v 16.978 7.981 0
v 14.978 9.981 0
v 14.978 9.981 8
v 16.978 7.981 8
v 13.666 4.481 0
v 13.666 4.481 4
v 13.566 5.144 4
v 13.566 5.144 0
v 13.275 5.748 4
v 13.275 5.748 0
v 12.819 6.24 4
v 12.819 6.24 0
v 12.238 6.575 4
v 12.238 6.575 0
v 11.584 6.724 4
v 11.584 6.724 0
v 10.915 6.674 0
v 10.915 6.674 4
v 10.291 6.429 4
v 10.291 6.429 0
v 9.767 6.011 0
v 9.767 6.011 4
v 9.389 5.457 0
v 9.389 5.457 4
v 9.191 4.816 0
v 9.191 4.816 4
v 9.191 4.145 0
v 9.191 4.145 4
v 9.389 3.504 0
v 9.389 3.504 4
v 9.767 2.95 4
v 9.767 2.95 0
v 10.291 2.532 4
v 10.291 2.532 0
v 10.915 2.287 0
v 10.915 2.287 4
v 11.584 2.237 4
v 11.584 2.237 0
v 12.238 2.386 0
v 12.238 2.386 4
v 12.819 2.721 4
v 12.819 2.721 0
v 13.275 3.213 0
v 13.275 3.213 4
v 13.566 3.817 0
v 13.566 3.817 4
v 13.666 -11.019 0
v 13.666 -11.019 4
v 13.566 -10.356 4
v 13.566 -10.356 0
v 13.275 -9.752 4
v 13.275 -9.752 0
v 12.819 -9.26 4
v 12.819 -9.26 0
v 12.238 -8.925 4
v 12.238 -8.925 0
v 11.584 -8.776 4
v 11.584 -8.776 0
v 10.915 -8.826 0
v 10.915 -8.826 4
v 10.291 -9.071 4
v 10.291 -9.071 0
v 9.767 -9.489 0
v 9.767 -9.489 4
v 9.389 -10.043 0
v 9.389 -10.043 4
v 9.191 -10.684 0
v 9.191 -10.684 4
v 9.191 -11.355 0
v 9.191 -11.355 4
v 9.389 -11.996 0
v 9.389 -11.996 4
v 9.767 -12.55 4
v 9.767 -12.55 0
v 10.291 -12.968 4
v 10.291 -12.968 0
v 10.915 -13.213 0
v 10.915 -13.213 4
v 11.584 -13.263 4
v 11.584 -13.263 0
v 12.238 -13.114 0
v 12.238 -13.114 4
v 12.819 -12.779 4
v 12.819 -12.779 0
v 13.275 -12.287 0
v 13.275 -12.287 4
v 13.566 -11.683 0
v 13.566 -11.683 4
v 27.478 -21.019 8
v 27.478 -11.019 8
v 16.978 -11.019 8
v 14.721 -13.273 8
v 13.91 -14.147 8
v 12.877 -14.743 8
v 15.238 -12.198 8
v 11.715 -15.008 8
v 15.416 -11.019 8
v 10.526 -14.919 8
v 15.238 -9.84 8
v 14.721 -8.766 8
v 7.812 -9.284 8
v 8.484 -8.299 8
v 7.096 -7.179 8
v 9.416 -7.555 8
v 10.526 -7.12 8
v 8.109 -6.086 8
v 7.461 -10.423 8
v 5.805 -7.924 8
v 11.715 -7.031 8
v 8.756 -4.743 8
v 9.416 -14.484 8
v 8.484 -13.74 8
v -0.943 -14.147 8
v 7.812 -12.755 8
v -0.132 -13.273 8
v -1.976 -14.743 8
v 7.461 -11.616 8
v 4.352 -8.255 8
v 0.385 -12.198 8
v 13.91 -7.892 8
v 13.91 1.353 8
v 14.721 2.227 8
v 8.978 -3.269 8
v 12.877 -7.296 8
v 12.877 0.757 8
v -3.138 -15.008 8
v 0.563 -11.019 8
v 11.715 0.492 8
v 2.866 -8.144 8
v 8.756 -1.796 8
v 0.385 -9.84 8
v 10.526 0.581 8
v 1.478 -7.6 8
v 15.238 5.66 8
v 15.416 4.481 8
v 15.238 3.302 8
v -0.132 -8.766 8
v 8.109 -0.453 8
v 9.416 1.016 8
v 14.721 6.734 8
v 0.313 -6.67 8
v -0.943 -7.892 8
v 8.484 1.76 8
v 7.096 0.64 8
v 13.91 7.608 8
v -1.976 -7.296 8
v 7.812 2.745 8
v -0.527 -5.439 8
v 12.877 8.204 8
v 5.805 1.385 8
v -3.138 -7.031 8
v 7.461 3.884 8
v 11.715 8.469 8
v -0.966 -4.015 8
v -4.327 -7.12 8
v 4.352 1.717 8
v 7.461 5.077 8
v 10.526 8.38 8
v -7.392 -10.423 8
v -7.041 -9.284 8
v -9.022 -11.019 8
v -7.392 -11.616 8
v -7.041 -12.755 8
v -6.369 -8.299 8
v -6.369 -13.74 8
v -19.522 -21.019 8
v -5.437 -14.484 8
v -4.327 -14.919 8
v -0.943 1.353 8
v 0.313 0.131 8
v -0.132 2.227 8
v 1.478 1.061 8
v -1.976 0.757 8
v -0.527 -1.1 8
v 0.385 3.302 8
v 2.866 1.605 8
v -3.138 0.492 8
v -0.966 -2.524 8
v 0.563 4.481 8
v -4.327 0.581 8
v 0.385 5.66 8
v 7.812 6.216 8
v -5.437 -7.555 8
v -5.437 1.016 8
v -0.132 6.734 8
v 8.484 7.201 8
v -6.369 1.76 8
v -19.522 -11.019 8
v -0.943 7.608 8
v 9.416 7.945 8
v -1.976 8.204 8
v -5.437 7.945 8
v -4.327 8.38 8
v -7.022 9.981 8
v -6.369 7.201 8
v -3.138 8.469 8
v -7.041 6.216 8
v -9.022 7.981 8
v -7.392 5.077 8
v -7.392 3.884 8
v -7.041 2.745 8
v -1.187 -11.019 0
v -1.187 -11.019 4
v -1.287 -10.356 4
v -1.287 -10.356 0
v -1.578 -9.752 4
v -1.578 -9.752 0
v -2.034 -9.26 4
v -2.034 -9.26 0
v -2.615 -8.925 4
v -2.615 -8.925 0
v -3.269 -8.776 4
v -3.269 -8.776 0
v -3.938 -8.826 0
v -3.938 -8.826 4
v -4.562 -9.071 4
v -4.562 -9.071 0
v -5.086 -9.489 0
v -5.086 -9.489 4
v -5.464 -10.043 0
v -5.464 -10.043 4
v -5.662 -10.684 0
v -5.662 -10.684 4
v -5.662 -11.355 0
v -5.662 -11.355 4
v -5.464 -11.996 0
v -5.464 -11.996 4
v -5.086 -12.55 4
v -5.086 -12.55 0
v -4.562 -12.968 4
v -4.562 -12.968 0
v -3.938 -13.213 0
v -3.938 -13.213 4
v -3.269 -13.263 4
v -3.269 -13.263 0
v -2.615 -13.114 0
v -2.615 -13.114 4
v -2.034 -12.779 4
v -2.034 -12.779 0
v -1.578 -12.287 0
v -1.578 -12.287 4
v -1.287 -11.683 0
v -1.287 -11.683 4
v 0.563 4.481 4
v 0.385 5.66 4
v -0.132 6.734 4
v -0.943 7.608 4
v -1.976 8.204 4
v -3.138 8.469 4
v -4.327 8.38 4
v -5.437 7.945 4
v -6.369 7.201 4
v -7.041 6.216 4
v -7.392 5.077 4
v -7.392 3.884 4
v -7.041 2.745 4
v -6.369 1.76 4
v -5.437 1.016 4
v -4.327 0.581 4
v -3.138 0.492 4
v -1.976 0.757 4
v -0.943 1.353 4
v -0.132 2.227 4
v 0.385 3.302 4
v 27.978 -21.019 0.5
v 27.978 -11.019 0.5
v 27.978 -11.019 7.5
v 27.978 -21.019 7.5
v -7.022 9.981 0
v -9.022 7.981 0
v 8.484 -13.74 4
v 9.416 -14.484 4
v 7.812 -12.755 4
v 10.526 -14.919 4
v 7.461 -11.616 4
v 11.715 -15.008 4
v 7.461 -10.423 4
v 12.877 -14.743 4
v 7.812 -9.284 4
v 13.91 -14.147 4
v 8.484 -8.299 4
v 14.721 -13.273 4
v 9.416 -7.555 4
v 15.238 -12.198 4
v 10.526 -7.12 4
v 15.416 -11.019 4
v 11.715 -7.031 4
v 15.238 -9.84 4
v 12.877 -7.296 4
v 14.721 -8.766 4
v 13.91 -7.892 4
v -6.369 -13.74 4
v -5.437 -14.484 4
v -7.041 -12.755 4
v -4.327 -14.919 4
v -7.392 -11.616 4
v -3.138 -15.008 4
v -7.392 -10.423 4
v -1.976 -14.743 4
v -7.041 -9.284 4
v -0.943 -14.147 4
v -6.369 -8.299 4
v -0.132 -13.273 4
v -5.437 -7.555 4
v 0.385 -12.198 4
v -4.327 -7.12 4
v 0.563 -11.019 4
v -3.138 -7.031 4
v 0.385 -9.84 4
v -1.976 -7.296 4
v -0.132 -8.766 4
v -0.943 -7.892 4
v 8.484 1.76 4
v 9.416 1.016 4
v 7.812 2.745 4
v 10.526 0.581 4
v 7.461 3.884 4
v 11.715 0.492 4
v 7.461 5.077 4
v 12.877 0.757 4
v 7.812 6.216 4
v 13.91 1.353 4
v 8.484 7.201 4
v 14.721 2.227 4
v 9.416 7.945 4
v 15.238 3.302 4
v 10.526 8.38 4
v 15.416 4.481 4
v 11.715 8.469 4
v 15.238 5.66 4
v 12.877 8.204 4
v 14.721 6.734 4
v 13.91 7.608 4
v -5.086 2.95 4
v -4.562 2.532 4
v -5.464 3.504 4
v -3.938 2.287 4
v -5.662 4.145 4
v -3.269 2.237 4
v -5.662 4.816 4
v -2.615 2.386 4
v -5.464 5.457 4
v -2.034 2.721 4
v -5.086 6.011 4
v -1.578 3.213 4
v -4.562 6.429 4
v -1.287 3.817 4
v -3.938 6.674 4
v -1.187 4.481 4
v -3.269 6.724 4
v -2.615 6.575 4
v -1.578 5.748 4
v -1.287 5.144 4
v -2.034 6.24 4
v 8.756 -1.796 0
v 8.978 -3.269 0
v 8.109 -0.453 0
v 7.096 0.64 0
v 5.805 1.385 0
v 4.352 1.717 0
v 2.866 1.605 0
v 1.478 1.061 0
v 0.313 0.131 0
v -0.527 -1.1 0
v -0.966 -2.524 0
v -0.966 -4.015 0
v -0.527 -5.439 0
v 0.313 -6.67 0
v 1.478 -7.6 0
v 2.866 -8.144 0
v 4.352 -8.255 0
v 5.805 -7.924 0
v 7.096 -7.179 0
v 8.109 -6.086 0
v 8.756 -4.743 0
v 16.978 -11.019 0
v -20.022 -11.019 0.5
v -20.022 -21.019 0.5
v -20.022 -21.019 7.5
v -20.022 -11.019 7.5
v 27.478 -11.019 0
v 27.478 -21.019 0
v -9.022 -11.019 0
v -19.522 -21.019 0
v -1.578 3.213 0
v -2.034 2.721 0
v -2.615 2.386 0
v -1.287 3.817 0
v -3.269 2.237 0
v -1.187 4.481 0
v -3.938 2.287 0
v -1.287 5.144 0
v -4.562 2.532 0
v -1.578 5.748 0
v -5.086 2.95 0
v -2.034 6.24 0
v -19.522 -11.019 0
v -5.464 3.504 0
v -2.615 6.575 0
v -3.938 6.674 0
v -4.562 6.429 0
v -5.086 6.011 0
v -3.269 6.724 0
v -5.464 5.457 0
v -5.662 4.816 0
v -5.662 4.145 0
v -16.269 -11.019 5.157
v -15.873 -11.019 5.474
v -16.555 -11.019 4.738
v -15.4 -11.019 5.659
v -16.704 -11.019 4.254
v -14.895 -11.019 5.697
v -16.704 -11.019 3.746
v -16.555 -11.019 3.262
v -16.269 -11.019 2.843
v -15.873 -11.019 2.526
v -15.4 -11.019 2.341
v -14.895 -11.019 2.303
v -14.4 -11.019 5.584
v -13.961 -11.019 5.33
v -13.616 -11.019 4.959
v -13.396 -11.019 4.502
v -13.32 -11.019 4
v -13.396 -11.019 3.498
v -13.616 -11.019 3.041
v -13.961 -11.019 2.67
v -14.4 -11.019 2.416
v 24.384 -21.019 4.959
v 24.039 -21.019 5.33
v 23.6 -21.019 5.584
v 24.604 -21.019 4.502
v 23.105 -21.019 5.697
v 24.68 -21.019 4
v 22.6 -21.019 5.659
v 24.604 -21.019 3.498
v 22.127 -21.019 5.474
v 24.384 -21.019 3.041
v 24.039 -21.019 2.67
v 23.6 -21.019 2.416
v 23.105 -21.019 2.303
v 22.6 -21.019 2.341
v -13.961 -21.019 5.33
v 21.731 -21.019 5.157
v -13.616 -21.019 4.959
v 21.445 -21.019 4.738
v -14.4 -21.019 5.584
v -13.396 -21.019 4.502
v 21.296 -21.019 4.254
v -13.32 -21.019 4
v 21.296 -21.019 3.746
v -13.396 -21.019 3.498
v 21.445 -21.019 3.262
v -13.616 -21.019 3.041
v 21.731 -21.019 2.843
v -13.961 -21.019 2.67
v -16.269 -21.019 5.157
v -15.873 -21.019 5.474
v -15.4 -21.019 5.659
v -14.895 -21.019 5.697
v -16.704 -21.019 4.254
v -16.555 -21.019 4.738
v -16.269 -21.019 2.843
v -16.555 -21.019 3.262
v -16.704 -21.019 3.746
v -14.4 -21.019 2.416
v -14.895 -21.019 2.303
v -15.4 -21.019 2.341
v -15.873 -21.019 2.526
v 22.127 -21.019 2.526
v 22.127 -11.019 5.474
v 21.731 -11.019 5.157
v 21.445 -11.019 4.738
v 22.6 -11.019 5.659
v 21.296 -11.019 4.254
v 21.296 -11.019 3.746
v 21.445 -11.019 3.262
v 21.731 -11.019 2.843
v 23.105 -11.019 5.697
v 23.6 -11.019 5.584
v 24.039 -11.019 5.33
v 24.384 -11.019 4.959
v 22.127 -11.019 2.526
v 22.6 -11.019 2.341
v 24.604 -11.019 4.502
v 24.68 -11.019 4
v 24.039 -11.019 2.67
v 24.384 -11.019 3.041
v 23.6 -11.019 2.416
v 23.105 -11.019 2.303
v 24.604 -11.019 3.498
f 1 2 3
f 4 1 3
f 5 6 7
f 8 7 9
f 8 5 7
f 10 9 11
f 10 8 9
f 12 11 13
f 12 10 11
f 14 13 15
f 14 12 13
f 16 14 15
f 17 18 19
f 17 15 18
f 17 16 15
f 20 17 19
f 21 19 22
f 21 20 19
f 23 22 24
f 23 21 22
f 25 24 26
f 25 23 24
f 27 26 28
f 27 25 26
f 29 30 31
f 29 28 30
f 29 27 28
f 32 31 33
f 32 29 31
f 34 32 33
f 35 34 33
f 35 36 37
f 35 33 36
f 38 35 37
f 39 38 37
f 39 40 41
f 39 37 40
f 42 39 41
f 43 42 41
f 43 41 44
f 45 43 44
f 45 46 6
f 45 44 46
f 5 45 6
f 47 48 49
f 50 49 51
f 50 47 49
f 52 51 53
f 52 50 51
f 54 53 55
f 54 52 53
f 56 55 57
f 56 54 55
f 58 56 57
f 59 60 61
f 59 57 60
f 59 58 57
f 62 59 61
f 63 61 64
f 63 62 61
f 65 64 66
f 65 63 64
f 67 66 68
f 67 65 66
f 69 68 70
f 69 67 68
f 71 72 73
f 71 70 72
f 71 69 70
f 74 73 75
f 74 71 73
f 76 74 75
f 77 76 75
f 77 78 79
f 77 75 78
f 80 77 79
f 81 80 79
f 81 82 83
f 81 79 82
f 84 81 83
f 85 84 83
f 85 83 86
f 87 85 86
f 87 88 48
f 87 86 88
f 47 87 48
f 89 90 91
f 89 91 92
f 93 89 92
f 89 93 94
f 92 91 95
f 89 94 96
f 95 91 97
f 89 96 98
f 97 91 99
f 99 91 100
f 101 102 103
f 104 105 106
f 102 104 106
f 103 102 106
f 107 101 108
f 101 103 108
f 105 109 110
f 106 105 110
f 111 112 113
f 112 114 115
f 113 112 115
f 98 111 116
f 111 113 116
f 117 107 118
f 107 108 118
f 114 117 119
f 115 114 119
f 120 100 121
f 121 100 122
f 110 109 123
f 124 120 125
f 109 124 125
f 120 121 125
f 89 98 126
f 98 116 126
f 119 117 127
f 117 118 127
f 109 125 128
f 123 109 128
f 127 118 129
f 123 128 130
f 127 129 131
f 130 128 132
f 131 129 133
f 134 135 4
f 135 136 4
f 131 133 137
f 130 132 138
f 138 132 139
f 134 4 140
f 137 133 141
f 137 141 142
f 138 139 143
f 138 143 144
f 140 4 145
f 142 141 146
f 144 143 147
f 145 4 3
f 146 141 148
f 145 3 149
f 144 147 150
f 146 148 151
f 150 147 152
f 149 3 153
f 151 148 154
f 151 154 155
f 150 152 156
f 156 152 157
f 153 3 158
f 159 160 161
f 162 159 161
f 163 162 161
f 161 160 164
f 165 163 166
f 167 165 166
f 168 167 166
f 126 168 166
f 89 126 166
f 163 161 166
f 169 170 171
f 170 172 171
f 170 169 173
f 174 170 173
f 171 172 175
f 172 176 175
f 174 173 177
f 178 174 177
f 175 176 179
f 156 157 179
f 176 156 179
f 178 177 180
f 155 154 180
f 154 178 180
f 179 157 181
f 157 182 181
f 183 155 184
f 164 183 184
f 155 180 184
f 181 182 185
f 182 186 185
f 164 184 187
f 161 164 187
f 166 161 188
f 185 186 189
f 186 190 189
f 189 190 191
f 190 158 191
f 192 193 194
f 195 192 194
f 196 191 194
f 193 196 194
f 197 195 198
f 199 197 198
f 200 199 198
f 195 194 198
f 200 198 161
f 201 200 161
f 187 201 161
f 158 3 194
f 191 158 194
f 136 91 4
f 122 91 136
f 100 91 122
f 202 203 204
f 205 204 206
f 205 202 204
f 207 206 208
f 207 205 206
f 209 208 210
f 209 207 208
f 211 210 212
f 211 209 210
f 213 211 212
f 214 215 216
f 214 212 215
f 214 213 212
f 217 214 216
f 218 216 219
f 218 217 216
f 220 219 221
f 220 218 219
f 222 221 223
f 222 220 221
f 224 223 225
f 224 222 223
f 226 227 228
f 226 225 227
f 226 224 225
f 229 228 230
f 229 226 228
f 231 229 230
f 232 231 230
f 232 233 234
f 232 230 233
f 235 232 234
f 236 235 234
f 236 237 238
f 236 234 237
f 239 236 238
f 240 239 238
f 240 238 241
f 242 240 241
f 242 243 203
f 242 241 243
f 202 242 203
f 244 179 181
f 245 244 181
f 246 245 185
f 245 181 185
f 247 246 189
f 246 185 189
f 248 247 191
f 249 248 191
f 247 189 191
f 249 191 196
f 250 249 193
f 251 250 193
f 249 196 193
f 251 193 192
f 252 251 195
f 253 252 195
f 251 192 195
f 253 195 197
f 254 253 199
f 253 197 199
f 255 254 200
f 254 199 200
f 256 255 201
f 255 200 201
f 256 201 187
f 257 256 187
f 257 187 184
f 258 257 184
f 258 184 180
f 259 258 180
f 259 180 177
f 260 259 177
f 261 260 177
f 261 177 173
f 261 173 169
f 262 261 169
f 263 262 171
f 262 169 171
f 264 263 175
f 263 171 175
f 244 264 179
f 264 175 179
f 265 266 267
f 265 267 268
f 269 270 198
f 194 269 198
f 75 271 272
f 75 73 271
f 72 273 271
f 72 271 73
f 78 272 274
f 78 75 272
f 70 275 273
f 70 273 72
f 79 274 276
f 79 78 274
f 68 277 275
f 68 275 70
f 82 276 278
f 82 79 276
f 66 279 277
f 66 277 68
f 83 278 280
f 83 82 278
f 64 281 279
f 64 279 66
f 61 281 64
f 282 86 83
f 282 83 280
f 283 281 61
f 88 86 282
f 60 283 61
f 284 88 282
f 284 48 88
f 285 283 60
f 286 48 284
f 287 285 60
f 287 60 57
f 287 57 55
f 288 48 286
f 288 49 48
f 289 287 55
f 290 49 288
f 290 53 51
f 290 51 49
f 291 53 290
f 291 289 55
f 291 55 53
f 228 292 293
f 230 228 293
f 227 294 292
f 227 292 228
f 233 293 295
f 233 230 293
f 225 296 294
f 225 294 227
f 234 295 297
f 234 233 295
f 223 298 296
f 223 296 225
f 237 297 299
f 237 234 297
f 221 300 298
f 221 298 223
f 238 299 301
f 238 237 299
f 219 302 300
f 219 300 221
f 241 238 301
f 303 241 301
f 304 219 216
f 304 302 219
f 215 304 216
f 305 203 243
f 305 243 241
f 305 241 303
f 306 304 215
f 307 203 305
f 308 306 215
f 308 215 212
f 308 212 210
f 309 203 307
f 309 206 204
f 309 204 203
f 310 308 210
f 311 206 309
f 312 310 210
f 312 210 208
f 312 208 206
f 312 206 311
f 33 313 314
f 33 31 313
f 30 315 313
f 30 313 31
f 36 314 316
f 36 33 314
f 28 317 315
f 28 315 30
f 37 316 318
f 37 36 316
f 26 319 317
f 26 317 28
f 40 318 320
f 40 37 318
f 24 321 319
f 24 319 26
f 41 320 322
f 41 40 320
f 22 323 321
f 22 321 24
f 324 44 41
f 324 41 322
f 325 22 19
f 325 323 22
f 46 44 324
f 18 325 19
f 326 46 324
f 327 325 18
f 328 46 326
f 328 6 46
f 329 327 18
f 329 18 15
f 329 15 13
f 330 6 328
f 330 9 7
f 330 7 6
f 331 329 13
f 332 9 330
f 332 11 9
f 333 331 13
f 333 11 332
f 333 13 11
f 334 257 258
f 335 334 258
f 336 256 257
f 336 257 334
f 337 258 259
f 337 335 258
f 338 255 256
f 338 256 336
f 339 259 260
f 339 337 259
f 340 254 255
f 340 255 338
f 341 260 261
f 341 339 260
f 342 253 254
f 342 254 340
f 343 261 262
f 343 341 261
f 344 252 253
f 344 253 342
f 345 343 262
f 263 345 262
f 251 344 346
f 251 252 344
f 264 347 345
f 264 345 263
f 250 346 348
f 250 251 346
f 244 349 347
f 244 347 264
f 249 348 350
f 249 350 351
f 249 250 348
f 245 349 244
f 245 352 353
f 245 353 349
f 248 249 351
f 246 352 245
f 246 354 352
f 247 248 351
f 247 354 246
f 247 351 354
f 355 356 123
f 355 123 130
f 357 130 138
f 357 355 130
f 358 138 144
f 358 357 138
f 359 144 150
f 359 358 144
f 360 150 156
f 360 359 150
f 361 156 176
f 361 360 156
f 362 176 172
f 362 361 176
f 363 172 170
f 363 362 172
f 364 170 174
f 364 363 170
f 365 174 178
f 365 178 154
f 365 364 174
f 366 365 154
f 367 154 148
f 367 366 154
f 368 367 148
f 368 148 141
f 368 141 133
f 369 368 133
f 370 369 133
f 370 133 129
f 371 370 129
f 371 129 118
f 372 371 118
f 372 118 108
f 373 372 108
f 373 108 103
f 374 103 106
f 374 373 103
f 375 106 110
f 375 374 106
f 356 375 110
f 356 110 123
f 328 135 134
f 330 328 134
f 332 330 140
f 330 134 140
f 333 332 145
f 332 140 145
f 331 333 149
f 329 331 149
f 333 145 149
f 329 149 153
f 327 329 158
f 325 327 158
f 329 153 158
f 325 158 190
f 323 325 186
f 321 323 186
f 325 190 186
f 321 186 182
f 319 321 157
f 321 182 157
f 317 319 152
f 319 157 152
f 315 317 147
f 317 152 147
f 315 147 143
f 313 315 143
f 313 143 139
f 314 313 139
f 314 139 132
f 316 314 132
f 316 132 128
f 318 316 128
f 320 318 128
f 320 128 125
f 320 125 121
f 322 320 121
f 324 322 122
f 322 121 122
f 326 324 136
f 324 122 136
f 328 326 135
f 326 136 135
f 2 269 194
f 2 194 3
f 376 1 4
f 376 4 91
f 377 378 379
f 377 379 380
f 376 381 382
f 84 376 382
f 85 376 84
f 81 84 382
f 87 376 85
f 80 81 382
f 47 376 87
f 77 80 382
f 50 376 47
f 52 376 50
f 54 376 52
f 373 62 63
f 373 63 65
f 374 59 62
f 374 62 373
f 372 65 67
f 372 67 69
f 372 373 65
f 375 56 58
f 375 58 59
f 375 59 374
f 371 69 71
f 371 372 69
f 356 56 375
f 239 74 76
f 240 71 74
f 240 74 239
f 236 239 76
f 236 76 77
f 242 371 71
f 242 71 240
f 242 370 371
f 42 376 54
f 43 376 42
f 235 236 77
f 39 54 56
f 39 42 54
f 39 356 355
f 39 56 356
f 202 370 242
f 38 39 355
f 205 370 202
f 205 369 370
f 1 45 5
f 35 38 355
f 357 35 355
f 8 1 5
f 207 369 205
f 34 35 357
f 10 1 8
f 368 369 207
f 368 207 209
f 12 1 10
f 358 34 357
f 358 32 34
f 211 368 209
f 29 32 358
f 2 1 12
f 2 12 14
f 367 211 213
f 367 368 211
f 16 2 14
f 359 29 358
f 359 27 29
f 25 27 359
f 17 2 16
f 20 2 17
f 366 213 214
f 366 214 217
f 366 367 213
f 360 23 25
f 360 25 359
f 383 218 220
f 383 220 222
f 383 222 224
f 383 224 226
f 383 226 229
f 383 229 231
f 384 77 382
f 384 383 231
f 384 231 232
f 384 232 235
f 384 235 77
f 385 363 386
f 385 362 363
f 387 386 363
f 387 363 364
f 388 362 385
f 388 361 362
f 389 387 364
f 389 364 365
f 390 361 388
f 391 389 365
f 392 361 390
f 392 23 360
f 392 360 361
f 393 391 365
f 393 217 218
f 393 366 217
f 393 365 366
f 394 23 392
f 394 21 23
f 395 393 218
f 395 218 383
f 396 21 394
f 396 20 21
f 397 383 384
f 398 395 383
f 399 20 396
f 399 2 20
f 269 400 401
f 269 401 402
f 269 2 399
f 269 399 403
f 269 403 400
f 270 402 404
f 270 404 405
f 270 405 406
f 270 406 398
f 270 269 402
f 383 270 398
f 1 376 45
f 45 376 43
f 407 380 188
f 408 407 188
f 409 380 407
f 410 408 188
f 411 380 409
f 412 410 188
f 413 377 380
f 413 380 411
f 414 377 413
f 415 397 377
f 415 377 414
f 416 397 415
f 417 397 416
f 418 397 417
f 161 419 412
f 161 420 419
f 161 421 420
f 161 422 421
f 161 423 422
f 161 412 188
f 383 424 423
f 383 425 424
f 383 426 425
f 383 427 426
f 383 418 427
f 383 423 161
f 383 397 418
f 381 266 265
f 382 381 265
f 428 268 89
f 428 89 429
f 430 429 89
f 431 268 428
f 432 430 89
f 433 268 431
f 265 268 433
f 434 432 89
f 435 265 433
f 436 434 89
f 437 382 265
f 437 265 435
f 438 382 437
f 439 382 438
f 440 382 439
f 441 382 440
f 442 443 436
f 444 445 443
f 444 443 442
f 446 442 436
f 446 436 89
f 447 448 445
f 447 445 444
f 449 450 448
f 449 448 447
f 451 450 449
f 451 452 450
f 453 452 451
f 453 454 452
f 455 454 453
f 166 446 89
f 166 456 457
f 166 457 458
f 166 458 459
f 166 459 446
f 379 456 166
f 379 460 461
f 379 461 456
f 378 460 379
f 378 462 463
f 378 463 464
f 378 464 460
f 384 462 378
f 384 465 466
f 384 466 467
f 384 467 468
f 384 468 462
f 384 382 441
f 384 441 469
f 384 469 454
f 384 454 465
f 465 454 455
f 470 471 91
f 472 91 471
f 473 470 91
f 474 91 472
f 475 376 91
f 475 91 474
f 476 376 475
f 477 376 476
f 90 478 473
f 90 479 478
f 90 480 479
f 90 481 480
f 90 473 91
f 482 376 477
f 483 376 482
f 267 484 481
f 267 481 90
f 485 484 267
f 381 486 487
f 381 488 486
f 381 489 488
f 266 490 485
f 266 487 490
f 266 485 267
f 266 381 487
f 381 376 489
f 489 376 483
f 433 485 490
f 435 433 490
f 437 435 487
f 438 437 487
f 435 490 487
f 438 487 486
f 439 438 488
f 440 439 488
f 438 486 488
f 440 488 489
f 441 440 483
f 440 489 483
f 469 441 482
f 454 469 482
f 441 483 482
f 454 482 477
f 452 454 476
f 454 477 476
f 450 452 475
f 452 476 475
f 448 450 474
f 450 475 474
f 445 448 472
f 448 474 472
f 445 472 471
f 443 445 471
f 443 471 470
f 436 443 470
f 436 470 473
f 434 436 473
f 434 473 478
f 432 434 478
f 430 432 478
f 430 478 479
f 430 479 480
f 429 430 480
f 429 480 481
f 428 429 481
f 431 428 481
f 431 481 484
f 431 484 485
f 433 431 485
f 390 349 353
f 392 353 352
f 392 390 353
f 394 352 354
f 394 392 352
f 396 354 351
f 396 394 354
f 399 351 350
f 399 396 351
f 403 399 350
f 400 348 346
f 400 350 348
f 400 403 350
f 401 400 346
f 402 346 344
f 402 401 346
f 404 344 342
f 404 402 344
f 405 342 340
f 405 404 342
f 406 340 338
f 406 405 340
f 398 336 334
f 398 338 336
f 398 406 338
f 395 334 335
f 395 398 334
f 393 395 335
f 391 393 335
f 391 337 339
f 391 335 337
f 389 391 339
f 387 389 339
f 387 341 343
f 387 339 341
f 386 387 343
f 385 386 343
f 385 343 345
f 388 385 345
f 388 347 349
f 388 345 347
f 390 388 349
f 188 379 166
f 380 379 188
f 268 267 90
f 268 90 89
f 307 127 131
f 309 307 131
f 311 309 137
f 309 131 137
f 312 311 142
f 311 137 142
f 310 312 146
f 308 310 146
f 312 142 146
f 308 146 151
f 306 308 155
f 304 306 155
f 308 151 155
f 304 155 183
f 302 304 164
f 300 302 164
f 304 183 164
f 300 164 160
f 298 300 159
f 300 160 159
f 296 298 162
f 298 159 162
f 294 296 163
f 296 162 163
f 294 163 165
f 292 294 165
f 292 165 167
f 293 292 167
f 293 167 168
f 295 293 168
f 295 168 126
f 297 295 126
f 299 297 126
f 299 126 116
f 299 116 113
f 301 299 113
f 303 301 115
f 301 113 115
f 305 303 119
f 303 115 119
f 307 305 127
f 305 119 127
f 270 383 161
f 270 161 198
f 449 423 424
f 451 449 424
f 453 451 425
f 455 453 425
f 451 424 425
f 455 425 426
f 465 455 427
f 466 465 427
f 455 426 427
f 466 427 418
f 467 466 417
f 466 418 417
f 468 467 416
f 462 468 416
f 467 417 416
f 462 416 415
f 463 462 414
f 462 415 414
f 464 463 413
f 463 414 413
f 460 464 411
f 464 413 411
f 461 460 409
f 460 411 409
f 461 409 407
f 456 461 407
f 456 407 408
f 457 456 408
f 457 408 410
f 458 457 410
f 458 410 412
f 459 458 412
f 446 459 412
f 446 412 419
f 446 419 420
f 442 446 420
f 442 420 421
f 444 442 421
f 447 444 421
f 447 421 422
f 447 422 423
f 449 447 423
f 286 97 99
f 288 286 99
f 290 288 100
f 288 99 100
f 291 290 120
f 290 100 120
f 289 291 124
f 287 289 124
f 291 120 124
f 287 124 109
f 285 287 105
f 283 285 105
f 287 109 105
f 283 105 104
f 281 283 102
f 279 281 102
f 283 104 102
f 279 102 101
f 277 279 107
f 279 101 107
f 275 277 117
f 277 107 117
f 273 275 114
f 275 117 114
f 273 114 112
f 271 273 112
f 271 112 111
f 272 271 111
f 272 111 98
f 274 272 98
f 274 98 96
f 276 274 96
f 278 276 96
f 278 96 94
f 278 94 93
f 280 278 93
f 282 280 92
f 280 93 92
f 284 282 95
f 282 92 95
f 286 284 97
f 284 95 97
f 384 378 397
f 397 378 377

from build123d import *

# Parameters (mm, degrees)
SKETCH1_R           = 2.25
SKETCH1_R_2         = 5
BOSS_EXTRUDE1_DEPTH = 8
SKETCH2_R           = 4
CUT_EXTRUDE1_DEPTH  = 4
SKETCH3_R           = 1.701572747
CUT_EXTRUDE2_DEPTH  = 32
CHAMFER1_SIZE       = 2
CHAMFER2_SIZE       = 0.5


with BuildPart() as part:
    # Sketch1 → Boss-Extrude1 (new body)
    with BuildSketch(Plane.XY):
        Polygon((16.978142077, -11.01947541), (27.978142077, -11.01947541), (27.978142077, -21.01947541), (-20.021857923, -21.01947541), (-20.021857923, -11.01947541), (-9.021857923, -11.01947541), (-9.021857923, 9.98052459), (16.978142077, 9.98052459), align=None)
        with Locations((-3.437114754, -11.01947541)):
            Circle(SKETCH1_R, mode=Mode.SUBTRACT)
        with Locations((11.416131148, -11.01947541)):
            Circle(SKETCH1_R, mode=Mode.SUBTRACT)
        with Locations((-3.437114754, 4.48052459)):
            Circle(SKETCH1_R, mode=Mode.SUBTRACT)
        with Locations((11.416131148, 4.48052459)):
            Circle(SKETCH1_R, mode=Mode.SUBTRACT)
        with Locations((3.978142077, -3.26947541)):
            Circle(SKETCH1_R_2, mode=Mode.SUBTRACT)
    extrude(amount=BOSS_EXTRUDE1_DEPTH)

    # Sketch2 → Cut-Extrude1 (cut)
    with BuildSketch(Plane.XY.offset(8)):
        with Locations((-3.437114754, 4.48052459)):
            Circle(SKETCH2_R)
        with Locations((11.416131148, 4.48052459)):
            Circle(SKETCH2_R)
        with Locations((-3.437114754, -11.01947541)):
            Circle(SKETCH2_R)
        with Locations((11.416131148, -11.01947541)):
            Circle(SKETCH2_R)
    extrude(amount=-CUT_EXTRUDE1_DEPTH, mode=Mode.SUBTRACT)

    # Sketch3 → Cut-Extrude2 (cut, through all)
    with BuildSketch(Plane(origin=(0, 9.98052459, 0), x_dir=(1, 0, 0), z_dir=(0, 1, 0))):
        with Locations((-15.021857923, -4)):
            Circle(SKETCH3_R)
        with Locations((22.978142077, -4)):
            Circle(SKETCH3_R)
    extrude(amount=-CUT_EXTRUDE2_DEPTH, mode=Mode.SUBTRACT)

    # Chamfer1
    chamfer1_edges = [part.edges().sort_by_distance(p)[0] for p in [
        (-9.021857923, 9.98052459, 4),
        (16.978142077, 9.98052459, 4),
    ]]
    chamfer(chamfer1_edges, length=CHAMFER1_SIZE)

    # Chamfer2
    chamfer2_edges = [part.edges().sort_by_distance(p)[0] for p in [
        (-20.021857923, -16.01947541, 8),
        (27.978142077, -16.01947541, 8),
        (27.978142077, -16.01947541, 0),
        (-20.021857923, -16.01947541, 0),
    ]]
    chamfer(chamfer2_edges, length=CHAMFER2_SIZE)


solid = part.part
